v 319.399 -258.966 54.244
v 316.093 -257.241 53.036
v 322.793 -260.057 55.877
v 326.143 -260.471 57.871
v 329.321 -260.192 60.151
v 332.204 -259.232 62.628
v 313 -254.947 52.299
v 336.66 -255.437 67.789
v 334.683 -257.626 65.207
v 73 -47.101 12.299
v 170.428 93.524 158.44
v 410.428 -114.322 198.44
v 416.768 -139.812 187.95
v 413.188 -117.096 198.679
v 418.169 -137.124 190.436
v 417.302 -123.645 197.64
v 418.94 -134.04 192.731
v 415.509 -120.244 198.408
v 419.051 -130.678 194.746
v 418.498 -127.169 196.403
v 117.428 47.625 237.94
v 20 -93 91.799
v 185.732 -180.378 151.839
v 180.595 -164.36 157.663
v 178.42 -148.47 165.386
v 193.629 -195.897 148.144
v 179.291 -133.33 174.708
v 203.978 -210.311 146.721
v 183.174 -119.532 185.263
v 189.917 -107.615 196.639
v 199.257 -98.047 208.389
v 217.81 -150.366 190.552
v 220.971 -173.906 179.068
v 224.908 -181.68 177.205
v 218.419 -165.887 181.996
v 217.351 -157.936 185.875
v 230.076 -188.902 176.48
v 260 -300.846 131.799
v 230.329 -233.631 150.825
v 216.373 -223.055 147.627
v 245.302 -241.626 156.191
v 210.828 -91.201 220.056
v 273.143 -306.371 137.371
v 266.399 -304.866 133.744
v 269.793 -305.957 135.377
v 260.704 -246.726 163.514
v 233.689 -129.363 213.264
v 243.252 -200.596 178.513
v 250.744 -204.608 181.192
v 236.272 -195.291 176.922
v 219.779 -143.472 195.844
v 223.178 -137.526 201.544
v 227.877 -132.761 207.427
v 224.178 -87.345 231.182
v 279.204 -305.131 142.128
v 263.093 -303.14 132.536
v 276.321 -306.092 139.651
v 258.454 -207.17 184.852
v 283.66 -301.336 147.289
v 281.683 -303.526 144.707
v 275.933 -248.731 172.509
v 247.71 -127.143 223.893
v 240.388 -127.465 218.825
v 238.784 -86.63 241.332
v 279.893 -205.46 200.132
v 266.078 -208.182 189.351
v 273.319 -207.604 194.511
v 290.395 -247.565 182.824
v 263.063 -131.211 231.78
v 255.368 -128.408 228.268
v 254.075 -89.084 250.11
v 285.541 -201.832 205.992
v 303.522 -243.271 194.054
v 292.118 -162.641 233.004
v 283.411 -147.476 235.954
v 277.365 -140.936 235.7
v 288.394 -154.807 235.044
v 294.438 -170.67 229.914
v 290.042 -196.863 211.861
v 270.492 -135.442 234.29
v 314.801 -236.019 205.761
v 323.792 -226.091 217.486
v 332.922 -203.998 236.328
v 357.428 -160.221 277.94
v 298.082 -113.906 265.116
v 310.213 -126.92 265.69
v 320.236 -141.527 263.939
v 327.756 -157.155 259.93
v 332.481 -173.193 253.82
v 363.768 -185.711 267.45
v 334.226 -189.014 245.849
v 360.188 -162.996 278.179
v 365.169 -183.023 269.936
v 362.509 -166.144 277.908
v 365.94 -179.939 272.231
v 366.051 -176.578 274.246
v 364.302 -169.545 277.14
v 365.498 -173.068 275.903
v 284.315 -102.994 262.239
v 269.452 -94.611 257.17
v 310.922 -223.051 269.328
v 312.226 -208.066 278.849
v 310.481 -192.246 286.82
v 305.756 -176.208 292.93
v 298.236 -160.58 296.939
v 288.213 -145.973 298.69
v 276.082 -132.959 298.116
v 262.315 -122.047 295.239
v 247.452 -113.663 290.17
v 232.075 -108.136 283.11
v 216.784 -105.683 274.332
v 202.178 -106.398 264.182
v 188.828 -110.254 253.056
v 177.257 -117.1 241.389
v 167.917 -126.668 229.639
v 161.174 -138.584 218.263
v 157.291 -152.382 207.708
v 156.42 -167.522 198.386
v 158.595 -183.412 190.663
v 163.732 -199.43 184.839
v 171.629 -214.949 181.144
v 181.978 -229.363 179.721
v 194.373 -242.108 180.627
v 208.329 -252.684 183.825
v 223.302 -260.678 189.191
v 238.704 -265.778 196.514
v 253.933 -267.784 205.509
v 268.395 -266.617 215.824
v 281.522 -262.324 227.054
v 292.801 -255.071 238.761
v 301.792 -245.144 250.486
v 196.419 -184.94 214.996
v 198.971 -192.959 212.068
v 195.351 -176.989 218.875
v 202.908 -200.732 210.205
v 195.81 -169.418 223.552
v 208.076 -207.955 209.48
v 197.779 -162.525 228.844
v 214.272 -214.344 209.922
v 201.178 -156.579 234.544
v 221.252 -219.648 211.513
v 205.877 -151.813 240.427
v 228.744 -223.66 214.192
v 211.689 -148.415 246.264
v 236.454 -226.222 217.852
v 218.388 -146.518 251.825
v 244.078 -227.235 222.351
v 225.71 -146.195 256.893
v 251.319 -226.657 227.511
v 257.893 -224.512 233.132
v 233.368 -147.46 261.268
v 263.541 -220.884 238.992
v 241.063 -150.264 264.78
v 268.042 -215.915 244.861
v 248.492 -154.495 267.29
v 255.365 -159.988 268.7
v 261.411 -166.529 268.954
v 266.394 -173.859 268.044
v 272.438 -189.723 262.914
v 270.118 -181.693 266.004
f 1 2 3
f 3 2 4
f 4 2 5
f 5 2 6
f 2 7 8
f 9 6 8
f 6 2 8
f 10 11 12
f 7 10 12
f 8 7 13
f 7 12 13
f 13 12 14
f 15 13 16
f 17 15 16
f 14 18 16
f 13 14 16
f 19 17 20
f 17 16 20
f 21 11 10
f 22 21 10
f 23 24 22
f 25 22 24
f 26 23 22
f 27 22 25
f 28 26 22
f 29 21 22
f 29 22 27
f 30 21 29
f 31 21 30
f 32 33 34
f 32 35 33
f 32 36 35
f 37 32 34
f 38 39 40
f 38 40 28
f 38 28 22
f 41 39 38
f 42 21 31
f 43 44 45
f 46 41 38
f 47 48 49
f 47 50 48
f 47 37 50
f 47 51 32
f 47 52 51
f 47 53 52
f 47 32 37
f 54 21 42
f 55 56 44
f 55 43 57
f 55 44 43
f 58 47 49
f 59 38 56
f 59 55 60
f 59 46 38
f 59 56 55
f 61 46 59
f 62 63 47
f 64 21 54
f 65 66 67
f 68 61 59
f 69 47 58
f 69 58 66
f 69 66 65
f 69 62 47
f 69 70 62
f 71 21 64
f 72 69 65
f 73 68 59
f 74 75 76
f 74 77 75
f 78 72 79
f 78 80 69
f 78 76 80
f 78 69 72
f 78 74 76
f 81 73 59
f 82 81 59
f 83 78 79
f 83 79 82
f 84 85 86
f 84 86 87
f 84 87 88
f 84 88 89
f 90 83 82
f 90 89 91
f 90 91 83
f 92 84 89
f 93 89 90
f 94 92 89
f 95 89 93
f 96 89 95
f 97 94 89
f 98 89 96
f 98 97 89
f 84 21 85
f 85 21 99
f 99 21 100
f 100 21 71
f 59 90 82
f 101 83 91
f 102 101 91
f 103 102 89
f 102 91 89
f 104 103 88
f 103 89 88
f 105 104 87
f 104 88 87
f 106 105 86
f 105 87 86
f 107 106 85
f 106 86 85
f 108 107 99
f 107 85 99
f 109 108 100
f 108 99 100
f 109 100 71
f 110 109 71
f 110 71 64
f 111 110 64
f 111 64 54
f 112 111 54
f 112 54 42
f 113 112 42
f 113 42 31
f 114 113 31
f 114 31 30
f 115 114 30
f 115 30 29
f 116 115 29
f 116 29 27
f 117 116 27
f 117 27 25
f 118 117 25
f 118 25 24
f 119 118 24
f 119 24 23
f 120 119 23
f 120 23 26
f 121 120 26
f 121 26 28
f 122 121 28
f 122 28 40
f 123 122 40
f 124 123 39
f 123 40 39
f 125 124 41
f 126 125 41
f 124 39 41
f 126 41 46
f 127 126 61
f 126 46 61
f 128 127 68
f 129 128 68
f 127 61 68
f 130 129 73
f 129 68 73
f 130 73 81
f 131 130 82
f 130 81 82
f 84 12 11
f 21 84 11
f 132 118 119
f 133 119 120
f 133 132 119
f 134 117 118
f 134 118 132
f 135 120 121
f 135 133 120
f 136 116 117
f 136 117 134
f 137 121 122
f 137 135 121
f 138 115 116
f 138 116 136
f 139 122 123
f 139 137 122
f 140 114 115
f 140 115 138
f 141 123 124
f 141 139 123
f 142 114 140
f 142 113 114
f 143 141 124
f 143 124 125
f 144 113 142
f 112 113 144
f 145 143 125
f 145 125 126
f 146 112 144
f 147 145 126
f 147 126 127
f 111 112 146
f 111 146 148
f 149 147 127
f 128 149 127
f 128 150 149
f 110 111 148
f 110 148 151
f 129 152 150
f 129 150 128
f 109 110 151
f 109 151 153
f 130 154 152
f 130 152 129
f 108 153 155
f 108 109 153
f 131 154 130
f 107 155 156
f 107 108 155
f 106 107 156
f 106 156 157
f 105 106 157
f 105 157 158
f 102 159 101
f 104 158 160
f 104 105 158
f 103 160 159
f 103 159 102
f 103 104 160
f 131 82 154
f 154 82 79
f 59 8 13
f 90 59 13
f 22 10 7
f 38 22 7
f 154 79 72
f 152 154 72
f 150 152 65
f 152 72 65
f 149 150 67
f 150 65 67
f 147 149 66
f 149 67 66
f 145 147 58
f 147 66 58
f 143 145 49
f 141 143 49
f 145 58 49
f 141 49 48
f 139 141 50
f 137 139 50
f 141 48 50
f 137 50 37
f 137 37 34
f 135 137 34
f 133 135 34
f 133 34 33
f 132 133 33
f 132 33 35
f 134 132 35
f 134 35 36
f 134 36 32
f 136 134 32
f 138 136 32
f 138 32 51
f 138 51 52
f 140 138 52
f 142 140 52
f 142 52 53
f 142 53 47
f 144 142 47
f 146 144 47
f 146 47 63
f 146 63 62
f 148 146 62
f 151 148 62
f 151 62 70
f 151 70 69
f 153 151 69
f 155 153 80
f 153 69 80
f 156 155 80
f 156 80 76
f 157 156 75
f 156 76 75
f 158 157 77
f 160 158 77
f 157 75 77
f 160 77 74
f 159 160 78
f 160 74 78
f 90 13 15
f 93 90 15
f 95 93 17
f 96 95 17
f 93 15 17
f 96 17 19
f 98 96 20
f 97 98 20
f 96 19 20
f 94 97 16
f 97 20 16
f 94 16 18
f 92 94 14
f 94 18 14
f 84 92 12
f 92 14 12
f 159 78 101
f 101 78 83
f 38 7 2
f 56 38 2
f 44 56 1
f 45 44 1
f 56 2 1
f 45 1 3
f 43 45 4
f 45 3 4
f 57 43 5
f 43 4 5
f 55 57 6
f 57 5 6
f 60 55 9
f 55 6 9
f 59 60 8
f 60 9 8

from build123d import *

# Parameters (mm, degrees)
F1_DEPTH = 106
F2_DEPTH = 150
F3_ANGLE = 30
F4_ANGLE = 30
F5_ANGLE = 30


with BuildPart() as f1:
    # F0 (on Top) → F1 (new body)
    with BuildSketch(Plane.XY):
        with BuildLine():
            Line((340, 185), (20, 185))
            Line((20, 185), (20, -40))
            Line((20, -40), (340, -40))
            ThreePointArc((340, -40), (354.1421356237, -34.1421356237), (360, -20))
            Line((360, -20), (360, 165))
            ThreePointArc((360, 165), (354.1421356237, 179.1421356237), (340, 185))
        make_face()
        with BuildLine():
            ThreePointArc((350, 90), (171.2961296312, 74.7808219147), (344.8528137424, 120))
            Line((344.8528137424, 120), (293.5410196625, 120))
            ThreePointArc((293.5410196625, 120), (217.9622438467, 73.9430059602), (305, 90))
            Line((305, 90), (350, 90))
        make_face(mode=Mode.SUBTRACT)
        with BuildLine():
            Line((293.5410196625, 120), (344.8528137424, 120))
            ThreePointArc((344.8528137424, 120), (171.2961296312, 74.7808219147), (350, 90))
            Line((350, 90), (305, 90))
            ThreePointArc((305, 90), (217.9622438467, 73.9430059602), (293.5410196625, 120))
        make_face()
    extrude(amount=F1_DEPTH)

    # F0 (on Top) → F2 (join)
    with BuildSketch(Plane.XY):
        with BuildLine():
            Line((293.5410196625, 120), (344.8528137424, 120))
            ThreePointArc((344.8528137424, 120), (171.2961296312, 74.7808219147), (350, 90))
            Line((350, 90), (305, 90))
            ThreePointArc((305, 90), (217.9622438467, 73.9430059602), (293.5410196625, 120))
        make_face()
    extrude(amount=F2_DEPTH)


with BuildPart() as f1_1:
    # F3: moved
    add(f1.part.rotate(Axis((180, -40, 0), (1, 0, 0)), F3_ANGLE))


with BuildPart() as f1_2:
    # F4: moved
    add(f1_1.part.rotate(Axis((20, 4.4278579257, 148.0486928012), (0, -0.8660254038, -0.5)), F4_ANGLE))


with BuildPart() as f1_3:
    # F5: moved
    add(f1_2.part.rotate(Axis((46.5, -70.0503267997, 52.0486928012), (0.5, 0.4330127019, -0.75)), F5_ANGLE))


solid = f1_3.part
